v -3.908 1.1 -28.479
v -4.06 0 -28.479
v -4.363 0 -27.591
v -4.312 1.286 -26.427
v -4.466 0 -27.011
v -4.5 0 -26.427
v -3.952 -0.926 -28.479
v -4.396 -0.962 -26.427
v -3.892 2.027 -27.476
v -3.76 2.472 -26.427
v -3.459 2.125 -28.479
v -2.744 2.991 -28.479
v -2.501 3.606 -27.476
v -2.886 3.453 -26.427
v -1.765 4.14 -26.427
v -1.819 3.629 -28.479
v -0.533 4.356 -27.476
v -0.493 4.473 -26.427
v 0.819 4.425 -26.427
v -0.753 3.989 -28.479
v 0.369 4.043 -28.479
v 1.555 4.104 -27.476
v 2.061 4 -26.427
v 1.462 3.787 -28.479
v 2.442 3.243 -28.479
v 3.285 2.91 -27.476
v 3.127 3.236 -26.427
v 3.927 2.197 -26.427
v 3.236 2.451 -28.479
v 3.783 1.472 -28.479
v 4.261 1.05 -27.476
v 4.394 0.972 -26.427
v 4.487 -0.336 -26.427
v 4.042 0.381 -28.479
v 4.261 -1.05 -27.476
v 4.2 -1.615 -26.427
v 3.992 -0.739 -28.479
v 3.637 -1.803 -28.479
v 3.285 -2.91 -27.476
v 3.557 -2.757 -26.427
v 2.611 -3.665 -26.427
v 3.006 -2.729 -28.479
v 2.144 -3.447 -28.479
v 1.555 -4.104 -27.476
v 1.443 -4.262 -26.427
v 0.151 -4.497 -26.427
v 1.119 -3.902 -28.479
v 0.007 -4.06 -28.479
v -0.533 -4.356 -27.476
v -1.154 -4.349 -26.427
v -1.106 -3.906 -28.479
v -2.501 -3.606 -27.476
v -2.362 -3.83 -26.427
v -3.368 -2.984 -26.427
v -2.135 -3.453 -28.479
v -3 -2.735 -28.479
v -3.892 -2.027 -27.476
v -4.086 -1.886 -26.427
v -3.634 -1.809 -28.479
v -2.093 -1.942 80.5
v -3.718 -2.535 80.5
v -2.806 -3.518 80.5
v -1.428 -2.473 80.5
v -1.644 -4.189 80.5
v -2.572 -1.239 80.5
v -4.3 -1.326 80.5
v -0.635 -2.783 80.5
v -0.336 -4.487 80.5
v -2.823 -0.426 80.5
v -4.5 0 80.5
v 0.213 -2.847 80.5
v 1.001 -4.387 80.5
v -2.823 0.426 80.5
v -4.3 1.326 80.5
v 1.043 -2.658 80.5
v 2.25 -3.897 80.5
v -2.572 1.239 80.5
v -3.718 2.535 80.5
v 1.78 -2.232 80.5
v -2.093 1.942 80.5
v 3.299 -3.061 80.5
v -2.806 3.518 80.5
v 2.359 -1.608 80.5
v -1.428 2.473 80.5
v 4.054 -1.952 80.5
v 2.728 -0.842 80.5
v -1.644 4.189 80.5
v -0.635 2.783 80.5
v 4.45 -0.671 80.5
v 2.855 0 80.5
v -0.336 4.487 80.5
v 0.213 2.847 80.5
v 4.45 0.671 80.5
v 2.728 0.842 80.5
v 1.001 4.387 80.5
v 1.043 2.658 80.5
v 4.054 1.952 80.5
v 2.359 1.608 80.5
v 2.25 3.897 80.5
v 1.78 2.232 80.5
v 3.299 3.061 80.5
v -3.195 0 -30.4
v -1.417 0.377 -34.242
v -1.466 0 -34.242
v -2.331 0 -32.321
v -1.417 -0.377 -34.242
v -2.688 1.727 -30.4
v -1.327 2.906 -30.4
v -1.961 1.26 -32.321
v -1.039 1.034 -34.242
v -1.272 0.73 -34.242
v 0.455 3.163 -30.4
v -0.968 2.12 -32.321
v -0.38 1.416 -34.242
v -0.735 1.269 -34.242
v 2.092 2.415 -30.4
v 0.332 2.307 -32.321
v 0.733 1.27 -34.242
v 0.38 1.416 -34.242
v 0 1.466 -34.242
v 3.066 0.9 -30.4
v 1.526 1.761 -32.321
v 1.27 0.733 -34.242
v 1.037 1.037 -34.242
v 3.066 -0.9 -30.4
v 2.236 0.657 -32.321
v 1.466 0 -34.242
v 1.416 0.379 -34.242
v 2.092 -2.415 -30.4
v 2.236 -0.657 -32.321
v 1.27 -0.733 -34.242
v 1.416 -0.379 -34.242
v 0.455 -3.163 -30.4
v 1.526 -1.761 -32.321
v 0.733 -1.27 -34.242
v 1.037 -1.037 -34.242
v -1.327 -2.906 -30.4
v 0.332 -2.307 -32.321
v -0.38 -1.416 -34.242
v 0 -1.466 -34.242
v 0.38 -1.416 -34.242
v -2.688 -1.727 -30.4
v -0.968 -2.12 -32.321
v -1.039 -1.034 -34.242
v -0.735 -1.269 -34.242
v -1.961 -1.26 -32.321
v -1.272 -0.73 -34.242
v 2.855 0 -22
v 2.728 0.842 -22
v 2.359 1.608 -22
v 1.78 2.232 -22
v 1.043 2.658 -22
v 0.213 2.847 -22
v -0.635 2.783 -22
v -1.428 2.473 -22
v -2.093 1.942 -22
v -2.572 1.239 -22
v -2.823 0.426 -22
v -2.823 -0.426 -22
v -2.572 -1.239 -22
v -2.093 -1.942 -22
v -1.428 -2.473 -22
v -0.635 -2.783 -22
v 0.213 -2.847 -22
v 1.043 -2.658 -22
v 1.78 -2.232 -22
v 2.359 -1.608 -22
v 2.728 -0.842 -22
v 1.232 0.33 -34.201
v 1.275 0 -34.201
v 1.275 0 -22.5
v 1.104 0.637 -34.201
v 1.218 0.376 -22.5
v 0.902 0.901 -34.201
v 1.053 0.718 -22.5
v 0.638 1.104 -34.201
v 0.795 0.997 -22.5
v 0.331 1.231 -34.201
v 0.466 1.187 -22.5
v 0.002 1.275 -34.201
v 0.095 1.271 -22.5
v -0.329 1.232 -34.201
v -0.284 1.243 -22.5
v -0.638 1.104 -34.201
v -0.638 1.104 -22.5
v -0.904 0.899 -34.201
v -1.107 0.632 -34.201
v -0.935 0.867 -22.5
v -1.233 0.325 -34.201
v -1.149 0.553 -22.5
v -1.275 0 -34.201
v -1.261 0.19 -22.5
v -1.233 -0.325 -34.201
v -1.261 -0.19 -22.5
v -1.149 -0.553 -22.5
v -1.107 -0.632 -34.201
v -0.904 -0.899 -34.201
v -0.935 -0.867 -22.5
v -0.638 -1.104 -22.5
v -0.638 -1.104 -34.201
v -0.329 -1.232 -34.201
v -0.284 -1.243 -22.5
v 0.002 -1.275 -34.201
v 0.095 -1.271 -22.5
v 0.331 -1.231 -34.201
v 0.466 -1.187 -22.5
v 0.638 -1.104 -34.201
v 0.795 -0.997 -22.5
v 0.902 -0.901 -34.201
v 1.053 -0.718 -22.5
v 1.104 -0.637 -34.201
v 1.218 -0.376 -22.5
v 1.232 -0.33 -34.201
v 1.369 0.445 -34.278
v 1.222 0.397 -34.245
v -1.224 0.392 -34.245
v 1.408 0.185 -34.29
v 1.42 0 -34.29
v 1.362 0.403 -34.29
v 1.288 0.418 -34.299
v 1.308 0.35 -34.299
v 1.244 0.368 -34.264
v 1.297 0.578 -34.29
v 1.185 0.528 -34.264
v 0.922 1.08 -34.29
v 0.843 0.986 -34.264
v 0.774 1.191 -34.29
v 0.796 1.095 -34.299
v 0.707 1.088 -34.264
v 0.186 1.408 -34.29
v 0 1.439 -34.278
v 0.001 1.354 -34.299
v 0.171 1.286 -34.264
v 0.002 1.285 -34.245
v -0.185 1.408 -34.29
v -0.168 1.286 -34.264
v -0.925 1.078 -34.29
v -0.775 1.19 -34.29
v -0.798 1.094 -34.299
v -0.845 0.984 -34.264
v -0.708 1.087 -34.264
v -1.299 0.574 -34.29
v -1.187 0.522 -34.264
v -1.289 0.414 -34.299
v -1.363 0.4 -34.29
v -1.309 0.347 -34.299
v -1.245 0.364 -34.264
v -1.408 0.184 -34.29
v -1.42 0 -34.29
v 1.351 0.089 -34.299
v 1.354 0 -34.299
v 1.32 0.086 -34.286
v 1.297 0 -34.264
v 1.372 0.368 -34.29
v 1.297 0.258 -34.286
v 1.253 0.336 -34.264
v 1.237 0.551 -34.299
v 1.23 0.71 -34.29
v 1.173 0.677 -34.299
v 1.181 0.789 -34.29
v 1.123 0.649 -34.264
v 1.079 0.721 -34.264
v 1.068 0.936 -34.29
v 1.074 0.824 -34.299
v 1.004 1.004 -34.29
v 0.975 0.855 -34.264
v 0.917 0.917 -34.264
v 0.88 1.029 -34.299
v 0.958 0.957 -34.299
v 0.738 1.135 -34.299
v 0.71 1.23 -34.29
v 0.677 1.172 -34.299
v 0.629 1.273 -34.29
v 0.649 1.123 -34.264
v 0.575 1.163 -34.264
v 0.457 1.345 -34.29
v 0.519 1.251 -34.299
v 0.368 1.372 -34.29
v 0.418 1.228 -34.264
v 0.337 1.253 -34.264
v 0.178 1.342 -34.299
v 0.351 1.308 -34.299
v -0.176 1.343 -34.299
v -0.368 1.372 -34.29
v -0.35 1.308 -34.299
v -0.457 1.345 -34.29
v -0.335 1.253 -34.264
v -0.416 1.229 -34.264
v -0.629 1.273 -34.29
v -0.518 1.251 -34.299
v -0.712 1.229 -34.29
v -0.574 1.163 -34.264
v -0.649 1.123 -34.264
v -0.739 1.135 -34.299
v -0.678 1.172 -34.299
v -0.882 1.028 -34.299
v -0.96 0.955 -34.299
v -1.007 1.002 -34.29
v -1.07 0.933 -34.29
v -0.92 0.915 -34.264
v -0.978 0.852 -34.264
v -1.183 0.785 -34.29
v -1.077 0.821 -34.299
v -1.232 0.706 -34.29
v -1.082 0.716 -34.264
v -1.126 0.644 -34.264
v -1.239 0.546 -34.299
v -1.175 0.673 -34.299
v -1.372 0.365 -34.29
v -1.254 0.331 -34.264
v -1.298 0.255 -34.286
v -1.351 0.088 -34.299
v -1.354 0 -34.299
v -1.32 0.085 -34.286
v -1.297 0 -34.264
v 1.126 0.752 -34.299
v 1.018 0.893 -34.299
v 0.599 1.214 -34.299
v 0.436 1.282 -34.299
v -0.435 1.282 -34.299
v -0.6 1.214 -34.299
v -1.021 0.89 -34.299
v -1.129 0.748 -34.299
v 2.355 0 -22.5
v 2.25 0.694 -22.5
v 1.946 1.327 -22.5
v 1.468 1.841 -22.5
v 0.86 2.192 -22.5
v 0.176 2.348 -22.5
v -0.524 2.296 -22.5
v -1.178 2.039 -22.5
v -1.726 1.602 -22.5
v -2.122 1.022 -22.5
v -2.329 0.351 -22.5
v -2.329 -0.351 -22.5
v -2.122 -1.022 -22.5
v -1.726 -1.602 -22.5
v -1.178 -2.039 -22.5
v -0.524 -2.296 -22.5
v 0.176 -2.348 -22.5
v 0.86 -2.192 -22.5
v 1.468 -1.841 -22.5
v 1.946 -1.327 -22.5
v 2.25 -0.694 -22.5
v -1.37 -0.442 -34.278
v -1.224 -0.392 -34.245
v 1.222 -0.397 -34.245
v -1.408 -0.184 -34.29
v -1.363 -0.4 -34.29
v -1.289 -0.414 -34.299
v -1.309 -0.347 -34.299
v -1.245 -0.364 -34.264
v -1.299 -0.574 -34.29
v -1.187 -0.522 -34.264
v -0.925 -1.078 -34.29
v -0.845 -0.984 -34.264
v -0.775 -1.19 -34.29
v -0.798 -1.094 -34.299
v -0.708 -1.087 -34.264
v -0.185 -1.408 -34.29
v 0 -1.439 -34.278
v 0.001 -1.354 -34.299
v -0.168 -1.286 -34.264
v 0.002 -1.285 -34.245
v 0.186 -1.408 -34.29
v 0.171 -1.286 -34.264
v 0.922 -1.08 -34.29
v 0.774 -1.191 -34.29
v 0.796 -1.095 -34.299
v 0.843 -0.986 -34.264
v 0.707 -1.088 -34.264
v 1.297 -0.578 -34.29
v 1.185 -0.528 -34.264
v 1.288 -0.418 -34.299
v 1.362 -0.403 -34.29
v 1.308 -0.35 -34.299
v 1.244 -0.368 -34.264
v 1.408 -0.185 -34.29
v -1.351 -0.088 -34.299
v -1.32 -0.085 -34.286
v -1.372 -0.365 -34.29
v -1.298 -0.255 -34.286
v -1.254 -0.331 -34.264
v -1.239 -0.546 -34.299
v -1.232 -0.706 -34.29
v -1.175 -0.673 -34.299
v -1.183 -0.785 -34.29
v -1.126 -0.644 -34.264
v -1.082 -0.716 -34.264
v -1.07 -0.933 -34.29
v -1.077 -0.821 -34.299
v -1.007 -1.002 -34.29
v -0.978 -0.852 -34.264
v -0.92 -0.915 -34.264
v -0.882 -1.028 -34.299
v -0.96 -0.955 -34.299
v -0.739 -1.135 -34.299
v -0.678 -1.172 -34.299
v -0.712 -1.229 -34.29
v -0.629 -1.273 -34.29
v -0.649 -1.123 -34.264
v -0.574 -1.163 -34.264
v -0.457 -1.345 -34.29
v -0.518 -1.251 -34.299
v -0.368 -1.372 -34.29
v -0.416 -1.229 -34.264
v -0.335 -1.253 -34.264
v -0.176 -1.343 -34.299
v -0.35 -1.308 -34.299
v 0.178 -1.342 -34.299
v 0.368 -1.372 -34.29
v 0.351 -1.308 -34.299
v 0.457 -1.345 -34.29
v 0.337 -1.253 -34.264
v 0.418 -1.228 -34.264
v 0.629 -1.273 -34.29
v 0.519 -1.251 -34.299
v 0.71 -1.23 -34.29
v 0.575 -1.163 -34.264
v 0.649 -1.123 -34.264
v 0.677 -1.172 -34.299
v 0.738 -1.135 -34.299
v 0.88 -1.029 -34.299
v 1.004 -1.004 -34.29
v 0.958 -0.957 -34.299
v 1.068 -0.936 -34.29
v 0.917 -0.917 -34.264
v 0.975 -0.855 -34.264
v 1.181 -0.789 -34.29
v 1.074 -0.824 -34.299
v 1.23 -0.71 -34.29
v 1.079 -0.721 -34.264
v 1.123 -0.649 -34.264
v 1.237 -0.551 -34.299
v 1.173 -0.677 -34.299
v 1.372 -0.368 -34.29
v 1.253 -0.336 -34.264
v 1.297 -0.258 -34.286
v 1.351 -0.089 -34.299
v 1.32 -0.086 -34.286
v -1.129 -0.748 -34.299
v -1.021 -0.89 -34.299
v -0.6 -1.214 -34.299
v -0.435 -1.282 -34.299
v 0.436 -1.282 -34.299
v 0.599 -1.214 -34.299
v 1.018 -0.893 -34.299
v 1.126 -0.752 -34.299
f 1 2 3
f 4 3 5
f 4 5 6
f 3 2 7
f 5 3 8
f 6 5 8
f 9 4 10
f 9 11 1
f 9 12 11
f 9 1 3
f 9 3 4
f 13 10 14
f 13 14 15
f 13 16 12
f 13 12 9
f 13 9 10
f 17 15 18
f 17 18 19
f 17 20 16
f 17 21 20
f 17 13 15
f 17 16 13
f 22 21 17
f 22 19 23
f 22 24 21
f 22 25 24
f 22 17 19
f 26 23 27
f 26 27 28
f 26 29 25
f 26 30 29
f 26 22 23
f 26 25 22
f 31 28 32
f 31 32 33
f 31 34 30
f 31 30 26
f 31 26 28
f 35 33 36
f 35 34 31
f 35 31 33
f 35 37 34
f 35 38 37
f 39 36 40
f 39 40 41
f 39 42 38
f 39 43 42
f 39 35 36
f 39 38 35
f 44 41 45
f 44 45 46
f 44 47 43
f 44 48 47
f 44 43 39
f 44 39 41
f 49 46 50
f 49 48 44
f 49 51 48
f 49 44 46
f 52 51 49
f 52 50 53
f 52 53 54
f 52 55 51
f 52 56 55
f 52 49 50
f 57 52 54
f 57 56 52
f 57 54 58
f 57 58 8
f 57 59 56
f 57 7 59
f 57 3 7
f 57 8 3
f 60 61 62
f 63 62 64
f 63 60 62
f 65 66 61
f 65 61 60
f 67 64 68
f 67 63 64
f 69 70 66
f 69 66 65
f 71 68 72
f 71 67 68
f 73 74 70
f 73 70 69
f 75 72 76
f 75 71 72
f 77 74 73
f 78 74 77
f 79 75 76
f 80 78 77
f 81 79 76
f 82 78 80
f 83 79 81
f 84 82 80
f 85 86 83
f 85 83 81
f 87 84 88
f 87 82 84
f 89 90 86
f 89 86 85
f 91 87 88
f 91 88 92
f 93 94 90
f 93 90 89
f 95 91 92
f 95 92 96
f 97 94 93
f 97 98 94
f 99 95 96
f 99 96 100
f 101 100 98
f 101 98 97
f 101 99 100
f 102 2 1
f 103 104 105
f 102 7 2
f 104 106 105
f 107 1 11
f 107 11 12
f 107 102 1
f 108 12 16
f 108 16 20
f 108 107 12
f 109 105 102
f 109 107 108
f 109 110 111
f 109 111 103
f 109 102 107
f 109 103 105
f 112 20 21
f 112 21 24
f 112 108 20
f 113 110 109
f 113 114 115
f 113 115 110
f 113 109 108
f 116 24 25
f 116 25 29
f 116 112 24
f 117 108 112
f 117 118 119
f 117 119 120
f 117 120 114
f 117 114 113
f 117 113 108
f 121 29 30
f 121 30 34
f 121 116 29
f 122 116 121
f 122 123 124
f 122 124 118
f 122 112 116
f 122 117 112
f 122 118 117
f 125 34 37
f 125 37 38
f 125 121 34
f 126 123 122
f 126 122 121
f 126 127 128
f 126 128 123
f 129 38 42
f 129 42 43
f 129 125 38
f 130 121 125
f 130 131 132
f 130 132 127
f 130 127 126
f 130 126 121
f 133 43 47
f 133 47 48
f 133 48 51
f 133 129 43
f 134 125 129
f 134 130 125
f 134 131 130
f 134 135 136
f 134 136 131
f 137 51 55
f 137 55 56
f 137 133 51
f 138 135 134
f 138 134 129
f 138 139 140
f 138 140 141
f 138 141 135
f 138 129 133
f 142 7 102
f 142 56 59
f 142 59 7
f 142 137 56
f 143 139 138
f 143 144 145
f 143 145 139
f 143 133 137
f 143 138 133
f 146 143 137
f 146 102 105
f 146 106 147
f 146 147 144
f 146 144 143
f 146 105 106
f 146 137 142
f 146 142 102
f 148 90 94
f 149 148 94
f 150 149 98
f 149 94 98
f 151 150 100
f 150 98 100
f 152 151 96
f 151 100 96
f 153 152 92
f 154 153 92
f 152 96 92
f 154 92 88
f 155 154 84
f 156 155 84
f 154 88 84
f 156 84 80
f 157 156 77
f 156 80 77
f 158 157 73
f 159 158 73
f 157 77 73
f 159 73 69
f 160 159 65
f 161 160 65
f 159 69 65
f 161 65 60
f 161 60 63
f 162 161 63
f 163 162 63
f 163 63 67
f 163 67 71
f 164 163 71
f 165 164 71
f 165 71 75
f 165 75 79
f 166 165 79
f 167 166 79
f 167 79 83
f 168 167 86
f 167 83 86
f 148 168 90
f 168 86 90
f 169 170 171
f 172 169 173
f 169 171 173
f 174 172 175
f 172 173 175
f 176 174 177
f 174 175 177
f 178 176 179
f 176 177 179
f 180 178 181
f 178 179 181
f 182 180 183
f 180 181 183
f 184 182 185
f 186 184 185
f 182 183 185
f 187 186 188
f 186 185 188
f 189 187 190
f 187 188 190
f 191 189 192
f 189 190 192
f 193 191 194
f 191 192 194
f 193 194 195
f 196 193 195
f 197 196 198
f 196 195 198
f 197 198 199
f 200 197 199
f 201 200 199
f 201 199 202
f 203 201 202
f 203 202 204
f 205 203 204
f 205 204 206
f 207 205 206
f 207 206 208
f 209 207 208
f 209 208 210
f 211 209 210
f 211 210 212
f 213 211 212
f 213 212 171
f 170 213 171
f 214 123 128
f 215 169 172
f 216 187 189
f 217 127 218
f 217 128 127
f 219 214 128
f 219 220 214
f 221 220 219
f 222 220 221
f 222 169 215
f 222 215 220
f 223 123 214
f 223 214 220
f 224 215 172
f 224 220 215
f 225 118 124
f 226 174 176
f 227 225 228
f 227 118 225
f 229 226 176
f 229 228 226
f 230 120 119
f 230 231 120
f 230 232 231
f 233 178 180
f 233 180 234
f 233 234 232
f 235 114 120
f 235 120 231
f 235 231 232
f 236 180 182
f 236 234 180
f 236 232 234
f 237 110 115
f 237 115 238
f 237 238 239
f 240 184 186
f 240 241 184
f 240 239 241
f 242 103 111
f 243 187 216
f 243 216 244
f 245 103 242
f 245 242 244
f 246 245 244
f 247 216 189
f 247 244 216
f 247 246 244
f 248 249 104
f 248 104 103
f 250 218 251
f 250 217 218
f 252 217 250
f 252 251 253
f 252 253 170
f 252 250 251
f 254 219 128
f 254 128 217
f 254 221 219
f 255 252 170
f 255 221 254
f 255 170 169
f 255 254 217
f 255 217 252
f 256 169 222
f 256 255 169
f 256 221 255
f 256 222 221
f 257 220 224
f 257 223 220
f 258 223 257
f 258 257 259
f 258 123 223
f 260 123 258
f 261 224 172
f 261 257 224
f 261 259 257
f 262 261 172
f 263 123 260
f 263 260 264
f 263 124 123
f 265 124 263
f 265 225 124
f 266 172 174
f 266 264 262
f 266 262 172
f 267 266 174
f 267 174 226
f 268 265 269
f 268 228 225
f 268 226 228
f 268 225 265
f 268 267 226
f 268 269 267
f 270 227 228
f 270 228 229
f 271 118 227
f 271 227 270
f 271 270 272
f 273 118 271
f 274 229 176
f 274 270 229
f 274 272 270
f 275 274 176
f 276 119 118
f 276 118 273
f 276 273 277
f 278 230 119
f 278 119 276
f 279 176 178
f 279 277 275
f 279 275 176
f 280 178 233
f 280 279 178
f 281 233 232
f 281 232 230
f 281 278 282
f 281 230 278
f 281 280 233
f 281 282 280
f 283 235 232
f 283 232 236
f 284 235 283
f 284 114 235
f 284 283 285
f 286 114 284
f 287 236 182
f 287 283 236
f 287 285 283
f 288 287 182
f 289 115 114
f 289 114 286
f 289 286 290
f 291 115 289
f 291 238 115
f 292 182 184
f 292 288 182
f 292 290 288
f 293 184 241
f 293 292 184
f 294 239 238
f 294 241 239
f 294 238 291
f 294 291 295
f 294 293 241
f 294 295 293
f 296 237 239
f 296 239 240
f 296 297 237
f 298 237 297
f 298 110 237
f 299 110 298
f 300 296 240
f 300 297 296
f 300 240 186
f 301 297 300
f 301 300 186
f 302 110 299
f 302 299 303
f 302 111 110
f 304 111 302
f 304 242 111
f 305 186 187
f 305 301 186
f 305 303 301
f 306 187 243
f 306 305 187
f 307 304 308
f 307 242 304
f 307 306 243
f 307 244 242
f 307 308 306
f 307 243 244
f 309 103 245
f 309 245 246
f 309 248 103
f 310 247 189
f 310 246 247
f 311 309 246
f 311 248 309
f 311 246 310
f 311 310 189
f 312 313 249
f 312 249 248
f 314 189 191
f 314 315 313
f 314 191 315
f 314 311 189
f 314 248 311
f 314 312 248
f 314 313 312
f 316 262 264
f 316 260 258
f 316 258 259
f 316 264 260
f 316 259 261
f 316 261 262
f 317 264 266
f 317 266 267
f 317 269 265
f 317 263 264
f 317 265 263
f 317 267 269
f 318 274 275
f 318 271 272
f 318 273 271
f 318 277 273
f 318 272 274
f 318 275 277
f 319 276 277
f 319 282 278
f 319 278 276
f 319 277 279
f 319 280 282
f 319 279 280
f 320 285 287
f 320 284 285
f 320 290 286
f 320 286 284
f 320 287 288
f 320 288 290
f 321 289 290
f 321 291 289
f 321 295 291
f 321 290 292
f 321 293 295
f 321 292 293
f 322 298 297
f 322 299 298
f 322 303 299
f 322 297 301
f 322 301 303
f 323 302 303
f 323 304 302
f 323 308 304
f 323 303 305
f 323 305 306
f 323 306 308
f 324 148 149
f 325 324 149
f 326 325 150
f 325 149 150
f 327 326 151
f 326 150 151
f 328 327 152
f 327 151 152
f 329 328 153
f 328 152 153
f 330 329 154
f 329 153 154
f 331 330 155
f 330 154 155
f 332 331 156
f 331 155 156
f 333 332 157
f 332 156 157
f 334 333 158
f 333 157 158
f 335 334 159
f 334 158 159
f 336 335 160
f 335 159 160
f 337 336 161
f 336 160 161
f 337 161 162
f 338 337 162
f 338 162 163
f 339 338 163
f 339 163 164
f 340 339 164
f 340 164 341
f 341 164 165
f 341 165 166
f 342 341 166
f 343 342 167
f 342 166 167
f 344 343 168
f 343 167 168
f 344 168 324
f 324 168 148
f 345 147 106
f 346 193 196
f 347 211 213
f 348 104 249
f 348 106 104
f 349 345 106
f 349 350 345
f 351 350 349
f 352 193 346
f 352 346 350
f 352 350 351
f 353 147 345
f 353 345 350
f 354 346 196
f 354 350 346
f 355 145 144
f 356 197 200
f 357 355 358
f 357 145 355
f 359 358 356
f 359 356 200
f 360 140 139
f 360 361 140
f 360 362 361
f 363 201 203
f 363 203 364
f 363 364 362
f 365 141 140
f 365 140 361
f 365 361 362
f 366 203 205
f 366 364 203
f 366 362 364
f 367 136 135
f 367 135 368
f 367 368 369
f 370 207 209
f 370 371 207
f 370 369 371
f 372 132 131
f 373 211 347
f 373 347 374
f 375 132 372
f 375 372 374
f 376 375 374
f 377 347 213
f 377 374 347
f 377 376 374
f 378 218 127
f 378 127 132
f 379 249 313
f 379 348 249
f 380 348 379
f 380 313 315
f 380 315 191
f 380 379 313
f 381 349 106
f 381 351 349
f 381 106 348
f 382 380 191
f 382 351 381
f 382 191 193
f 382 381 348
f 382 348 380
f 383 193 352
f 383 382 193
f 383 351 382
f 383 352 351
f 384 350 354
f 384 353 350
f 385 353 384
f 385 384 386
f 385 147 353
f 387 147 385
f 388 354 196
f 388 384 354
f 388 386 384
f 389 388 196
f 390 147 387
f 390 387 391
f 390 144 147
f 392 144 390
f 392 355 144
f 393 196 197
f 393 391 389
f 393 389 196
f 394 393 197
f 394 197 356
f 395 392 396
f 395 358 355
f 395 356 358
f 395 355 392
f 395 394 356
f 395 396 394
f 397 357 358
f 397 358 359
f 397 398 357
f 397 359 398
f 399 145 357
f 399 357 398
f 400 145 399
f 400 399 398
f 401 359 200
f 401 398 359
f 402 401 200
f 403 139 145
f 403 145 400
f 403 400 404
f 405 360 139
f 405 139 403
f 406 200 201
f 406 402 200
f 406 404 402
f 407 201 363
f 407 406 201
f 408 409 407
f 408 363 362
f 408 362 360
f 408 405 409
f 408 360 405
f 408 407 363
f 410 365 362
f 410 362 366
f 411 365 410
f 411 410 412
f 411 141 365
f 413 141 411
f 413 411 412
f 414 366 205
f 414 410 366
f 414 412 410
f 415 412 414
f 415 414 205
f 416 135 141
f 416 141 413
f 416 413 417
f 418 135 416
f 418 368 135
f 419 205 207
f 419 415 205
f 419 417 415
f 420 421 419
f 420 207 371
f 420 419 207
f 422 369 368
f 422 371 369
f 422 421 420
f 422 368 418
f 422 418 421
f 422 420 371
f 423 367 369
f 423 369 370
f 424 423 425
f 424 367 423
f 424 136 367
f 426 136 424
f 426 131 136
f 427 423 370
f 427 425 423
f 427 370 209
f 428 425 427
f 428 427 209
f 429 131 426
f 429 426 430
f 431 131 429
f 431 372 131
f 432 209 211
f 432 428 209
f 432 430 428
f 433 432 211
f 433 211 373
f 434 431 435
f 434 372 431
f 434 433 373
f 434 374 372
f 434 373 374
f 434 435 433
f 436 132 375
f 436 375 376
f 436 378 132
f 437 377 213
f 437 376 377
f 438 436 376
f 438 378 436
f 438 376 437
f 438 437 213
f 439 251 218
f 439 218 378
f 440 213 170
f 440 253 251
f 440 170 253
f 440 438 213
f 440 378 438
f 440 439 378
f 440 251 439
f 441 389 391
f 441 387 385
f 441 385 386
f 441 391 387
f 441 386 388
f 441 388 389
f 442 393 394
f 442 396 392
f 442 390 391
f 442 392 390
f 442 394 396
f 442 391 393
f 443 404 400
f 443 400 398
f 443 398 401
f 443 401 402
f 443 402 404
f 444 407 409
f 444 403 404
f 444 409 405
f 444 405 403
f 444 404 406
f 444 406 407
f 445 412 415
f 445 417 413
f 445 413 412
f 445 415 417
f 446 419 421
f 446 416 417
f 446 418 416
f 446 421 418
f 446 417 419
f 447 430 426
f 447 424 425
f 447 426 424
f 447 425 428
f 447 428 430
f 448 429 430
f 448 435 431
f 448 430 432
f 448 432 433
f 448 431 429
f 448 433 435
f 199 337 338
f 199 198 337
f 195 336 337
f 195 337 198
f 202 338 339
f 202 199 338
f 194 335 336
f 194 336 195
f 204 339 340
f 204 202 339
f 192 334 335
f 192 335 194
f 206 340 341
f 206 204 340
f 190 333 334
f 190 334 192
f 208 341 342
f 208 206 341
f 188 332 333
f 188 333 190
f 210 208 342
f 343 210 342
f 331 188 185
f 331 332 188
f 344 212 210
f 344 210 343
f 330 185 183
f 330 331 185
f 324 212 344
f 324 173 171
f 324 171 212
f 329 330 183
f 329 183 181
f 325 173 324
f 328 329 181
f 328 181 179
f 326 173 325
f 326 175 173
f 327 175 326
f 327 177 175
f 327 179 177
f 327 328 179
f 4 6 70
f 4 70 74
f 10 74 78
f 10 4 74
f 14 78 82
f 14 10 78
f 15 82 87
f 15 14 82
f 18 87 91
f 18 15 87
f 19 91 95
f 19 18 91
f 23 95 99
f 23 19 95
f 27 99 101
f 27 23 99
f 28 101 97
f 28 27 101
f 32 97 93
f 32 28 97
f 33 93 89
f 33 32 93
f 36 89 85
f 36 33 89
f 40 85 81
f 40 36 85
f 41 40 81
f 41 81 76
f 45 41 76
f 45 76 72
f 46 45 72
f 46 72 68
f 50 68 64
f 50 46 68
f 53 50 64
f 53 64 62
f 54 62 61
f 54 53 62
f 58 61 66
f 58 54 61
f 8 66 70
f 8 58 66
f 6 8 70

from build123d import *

# Parameters (mm, degrees)
F2_R     = 2.855
F3_DEPTH = 103
F4_R     = 1.275
F5_DEPTH = 25
F6_R     = 0.1
F7_SIZE  = 0.5
F8_R     = 5


with BuildPart() as f1:
    # F0 (on Front) → F1 (revolve)
    with BuildSketch(Plane.XZ):
        Polygon((-4.5, -27.5000141266), (0, -37.5000141266), (0, 80.4999858734), (-4.5, 80.4999858734), (-4.5, 45.166639983), align=None)
    revolve(axis=Axis((0, 0, 21.4999858734), (0, 0, -1)))

    # F2 (on face) → F3 (cut)
    with BuildSketch(Plane.XY.offset(80.4999858734)):
        Circle(F2_R)
    extrude(amount=-F3_DEPTH, mode=Mode.SUBTRACT)

    # F4 (on face) → F5 (cut)
    with BuildSketch(Plane.XY.offset(-22.5000141266)):
        Circle(F4_R)
    extrude(amount=-F5_DEPTH, mode=Mode.SUBTRACT)

    # F6
    f6_edges = [f1.edges().sort_by_distance(p)[0] for p in [
        (0, 1.275, -34.666681),
        (0, -1.275, -34.666681),
    ]]
    fillet(f6_edges, radius=F6_R)

    # F7
    f7_edges = [f1.edges().sort_by_distance(p)[0] for p in [
        (-2.855, 0, -22.500014),
    ]]
    chamfer(f7_edges, length=F7_SIZE)

    # F8
    f8_edges = [f1.edges().sort_by_distance(p)[0] for p in [
        (4.5, 0, -27.500014),
    ]]
    fillet(f8_edges, radius=F8_R)


solid = f1.part
